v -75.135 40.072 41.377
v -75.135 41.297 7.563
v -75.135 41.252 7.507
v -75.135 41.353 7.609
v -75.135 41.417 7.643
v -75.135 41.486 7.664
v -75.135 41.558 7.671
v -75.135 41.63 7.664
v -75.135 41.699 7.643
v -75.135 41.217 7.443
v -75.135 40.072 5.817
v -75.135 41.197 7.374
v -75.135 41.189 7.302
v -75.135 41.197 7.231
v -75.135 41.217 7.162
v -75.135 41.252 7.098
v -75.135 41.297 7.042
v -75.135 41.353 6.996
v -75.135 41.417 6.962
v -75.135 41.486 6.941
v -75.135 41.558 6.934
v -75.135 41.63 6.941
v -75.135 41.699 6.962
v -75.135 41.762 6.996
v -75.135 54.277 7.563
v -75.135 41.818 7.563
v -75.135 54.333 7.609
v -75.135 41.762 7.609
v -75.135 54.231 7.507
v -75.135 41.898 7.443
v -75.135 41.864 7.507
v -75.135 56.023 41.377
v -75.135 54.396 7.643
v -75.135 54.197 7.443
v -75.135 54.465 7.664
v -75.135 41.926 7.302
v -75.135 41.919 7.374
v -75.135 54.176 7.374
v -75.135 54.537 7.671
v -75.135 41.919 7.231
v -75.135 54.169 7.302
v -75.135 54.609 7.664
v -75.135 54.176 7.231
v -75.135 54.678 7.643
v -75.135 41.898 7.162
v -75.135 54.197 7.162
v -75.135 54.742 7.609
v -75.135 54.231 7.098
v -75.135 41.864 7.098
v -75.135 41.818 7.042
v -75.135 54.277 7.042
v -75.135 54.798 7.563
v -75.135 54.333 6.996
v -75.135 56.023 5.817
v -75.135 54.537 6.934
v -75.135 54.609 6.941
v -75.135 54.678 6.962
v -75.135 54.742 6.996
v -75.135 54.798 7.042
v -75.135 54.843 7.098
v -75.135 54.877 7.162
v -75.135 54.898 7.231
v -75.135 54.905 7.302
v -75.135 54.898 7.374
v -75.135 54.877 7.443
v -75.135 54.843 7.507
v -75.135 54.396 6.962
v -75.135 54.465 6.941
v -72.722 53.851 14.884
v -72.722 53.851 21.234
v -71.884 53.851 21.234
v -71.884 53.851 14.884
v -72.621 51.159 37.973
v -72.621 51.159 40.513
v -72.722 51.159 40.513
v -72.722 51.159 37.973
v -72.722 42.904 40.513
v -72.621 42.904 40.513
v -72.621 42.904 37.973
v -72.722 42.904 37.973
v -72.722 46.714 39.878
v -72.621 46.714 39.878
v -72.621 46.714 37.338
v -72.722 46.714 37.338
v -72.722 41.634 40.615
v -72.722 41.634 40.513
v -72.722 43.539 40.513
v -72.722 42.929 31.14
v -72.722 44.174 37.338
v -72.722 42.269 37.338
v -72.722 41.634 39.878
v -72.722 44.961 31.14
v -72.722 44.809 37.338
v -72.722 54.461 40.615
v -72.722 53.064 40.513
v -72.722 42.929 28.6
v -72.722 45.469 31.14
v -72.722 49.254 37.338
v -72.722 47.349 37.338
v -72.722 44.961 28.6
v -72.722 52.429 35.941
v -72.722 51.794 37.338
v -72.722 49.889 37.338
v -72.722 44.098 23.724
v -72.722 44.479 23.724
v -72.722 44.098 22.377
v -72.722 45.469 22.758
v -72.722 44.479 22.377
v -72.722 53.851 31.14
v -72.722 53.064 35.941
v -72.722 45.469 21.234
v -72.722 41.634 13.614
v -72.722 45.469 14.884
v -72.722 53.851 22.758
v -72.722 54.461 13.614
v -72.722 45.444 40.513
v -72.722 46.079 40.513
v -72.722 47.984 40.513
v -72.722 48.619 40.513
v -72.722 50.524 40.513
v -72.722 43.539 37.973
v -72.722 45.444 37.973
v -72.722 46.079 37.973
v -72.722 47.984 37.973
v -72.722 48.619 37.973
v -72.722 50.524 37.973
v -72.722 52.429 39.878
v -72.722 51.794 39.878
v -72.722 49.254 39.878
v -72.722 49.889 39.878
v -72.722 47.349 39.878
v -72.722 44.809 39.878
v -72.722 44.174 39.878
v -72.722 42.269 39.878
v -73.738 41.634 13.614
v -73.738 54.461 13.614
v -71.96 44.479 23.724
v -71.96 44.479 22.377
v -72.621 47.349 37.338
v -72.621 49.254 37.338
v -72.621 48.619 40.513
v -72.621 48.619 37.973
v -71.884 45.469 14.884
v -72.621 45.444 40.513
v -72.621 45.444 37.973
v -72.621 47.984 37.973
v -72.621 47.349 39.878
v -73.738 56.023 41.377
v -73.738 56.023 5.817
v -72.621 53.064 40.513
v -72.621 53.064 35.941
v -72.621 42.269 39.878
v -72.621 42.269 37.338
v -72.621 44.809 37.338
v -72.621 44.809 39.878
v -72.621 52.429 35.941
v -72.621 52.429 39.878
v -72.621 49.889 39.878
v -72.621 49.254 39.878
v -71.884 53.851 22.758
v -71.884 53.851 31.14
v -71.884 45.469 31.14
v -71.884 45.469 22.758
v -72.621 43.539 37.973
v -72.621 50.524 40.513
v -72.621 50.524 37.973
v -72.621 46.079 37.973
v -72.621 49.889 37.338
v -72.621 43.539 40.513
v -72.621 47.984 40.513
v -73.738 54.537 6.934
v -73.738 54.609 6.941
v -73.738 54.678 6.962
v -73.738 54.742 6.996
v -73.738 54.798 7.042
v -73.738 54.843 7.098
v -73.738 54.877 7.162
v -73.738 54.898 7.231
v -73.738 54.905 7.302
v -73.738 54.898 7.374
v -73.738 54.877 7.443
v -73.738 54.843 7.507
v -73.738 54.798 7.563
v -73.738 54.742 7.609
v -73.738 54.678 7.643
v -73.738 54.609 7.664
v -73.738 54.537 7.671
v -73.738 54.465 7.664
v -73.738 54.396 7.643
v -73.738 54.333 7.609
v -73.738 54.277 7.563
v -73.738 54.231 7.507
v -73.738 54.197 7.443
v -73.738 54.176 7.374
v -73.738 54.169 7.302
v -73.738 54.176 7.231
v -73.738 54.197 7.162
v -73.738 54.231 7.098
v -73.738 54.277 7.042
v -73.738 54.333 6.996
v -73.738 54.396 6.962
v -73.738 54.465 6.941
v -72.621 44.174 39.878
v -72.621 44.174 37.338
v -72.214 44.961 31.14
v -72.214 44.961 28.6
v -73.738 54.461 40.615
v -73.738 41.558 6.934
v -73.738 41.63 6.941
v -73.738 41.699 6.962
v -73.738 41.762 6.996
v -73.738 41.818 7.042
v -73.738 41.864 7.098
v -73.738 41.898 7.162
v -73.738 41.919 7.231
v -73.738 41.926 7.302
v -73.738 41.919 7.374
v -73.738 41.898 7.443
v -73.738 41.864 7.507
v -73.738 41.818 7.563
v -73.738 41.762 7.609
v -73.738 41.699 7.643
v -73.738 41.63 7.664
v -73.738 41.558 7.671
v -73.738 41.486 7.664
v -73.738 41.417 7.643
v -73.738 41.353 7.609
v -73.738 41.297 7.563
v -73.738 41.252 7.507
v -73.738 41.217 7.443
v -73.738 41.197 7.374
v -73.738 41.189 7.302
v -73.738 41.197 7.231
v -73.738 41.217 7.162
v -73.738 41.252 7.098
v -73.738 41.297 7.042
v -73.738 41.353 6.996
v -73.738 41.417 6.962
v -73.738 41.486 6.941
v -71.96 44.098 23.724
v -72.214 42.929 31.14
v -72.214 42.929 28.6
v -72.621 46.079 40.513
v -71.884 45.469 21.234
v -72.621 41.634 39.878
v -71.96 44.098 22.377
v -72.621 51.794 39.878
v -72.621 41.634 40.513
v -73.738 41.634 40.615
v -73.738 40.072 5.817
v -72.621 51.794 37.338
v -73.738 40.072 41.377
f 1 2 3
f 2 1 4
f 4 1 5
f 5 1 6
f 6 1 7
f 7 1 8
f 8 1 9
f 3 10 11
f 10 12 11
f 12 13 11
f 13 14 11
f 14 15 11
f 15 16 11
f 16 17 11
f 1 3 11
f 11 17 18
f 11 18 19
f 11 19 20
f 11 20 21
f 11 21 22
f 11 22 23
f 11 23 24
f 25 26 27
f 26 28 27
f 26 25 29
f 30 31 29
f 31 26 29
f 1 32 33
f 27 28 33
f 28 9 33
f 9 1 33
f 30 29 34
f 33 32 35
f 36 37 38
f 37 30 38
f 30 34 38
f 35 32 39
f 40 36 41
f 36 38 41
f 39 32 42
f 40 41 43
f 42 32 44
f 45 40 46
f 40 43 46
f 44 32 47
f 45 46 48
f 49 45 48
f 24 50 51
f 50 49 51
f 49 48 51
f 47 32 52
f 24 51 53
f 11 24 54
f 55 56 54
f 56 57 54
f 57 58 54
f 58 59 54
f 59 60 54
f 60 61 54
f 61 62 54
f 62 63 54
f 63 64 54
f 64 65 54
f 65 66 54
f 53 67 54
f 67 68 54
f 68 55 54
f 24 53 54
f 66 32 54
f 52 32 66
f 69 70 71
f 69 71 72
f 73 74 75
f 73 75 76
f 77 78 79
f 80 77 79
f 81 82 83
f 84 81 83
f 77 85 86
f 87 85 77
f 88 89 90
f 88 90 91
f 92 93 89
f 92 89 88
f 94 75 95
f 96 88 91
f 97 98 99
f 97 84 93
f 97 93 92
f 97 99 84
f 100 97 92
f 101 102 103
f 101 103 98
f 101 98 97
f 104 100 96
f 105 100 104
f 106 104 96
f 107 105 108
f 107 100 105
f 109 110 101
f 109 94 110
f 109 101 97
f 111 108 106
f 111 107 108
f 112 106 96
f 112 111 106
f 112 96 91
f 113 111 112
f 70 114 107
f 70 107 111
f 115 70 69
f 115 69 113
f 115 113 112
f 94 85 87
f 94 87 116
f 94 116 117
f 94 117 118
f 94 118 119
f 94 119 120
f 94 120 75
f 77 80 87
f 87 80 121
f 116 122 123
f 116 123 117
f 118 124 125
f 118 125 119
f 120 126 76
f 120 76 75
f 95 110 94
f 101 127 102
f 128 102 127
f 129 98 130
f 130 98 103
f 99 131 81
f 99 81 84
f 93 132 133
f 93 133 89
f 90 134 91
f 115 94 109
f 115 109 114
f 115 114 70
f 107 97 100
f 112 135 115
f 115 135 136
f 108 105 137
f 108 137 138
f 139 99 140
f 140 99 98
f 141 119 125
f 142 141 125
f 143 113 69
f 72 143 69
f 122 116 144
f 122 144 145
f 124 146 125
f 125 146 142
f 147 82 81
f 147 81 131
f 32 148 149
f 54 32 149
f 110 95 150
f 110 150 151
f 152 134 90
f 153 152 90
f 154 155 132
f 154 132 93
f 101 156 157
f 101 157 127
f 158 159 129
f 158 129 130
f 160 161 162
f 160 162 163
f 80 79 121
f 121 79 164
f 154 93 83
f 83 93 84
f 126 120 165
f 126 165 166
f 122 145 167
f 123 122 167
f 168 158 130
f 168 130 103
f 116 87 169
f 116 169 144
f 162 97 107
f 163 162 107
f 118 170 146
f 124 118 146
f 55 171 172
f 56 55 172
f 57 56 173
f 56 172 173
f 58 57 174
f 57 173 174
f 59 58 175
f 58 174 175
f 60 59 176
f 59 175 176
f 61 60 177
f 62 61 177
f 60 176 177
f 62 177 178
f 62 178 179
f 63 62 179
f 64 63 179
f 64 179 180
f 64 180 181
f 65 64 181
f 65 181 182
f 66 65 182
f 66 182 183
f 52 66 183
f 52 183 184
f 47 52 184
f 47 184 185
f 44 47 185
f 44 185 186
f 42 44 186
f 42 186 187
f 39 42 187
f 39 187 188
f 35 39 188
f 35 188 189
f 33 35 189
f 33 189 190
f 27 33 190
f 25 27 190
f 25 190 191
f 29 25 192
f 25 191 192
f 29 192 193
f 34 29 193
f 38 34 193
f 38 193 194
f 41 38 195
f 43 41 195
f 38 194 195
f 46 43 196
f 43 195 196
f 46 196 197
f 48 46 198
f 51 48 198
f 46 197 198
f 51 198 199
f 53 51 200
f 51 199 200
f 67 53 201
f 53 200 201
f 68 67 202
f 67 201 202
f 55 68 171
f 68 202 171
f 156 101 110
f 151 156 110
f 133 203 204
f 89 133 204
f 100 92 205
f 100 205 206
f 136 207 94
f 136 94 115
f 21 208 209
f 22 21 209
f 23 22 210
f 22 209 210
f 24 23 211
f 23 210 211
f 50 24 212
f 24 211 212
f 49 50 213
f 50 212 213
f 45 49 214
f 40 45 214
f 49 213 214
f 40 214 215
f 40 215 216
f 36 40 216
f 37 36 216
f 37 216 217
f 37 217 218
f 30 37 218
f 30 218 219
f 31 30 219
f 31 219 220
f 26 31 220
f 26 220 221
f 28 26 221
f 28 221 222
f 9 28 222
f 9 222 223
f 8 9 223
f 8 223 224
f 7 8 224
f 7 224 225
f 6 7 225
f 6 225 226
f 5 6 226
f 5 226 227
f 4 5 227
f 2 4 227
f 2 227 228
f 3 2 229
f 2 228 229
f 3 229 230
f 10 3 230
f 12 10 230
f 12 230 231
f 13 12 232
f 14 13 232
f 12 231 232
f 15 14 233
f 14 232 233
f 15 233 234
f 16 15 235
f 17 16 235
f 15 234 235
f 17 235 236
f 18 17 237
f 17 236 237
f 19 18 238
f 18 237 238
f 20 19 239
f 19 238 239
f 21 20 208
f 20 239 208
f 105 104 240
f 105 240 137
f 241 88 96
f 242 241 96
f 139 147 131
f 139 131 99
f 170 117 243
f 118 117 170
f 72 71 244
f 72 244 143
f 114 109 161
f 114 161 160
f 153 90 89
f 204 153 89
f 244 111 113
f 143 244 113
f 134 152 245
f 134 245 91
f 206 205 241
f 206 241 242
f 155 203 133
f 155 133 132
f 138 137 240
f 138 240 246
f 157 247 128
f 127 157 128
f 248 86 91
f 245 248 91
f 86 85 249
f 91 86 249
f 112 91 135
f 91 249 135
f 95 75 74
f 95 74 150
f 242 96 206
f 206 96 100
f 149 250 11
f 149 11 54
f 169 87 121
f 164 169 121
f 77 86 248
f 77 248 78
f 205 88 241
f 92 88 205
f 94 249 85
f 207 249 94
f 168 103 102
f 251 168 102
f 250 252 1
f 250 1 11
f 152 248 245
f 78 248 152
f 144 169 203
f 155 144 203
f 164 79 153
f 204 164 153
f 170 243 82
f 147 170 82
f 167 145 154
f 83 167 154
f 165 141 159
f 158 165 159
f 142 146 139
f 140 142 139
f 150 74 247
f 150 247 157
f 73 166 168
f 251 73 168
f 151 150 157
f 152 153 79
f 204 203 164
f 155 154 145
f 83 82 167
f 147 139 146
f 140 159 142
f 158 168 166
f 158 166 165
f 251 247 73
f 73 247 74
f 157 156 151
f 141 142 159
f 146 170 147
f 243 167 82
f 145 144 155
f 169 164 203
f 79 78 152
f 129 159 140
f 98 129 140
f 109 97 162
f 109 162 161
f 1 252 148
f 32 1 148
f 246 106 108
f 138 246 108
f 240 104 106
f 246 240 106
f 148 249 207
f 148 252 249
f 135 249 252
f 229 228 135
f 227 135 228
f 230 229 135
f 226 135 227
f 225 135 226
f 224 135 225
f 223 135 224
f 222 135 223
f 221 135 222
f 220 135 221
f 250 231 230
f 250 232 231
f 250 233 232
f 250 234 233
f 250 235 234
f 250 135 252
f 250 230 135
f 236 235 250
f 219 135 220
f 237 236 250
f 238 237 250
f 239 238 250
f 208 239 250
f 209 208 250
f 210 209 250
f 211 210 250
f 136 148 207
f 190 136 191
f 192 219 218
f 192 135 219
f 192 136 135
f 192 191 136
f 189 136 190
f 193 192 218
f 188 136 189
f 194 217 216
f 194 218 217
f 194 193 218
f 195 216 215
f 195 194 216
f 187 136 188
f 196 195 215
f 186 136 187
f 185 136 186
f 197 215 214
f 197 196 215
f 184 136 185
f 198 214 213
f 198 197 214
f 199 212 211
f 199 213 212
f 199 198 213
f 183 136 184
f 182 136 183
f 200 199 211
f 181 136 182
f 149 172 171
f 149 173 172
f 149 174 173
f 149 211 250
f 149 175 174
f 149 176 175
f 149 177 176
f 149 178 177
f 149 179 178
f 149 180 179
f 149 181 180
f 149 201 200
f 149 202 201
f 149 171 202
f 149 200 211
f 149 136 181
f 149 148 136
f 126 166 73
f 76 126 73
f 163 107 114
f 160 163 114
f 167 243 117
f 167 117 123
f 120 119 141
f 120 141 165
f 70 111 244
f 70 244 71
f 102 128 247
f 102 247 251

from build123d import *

# Parameters (mm, degrees)
SKETCH1_W            = 35.56
SKETCH1_H            = 15.9512
BOSS_EXTRUDE1_DEPTH  = 1.397
SKETCH14_W           = 27.0002
SKETCH14_H           = 12.827
BOSS_EXTRUDE14_DEPTH = 1.016
SKETCH15_W           = 4.572
SKETCH15_H           = 11.43
BOSS_EXTRUDE15_DEPTH = 0.1016
SKETCH16_W           = 0.1016
SKETCH16_H           = 10.795
CUT_EXTRUDE1_DEPTH   = 3.937
SKETCH17_W           = 2.54
SKETCH17_H           = 9.525
BOSS_EXTRUDE16_DEPTH = 0.1016
SKETCH18_W           = 2.54
SKETCH18_H           = 3.175
CUT_EXTRUDE2_DEPTH   = 0.1016
SKETCH19_W           = 2.54
SKETCH19_H           = 1.905
BOSS_EXTRUDE17_DEPTH = 0.1016
SKETCH20_W           = 2.54
SKETCH20_H           = 0.635
CUT_EXTRUDE3_DEPTH   = 0.1016
SKETCH21_W           = 2.54
SKETCH21_H           = 0.635
CUT_EXTRUDE4_DEPTH   = 0.1016
SKETCH22_W           = 2.54
SKETCH22_H           = 3.175
CUT_EXTRUDE5_DEPTH   = 0.1016
SKETCH23_W           = 2.54
SKETCH23_H           = 1.905
BOSS_EXTRUDE18_DEPTH = 0.1016
SKETCH24_W           = 2.54
SKETCH24_H           = 0.635
CUT_EXTRUDE6_DEPTH   = 0.1016
SKETCH25_W           = 1.3462
SKETCH25_H           = 0.381
BOSS_EXTRUDE19_DEPTH = 0.762
SKETCH26_W           = 6.35
SKETCH26_H           = 8.382
BOSS_EXTRUDE20_DEPTH = 0.8382
SKETCH27_W           = 8.382
SKETCH27_H           = 8.382
BOSS_EXTRUDE21_DEPTH = 0.8382
SKETCH28_W           = 2.54
SKETCH28_H           = 2.032
BOSS_EXTRUDE22_DEPTH = 0.508
HOLE1_D              = 0.7366
HOLE1_DEPTH          = 3.2512


with BuildPart() as part:
    # Sketch1 → Boss-Extrude1 (new body)
    with BuildSketch(Plane(origin=(-73.738355388, 0, 0), x_dir=(0, 0, -1), z_dir=(1, 0, 0))):
        with Locations((-23.5966, 48.047439016)):
            Rectangle(SKETCH1_W, SKETCH1_H)
    extrude(amount=-BOSS_EXTRUDE1_DEPTH)

    # Sketch14 → Boss-Extrude14 (add)
    with BuildSketch(Plane(origin=(-73.738355388, 0, 0), x_dir=(0, 0, -1), z_dir=(1, 0, 0))):
        with Locations((-27.1145, 48.047439016)):
            Rectangle(SKETCH14_W, SKETCH14_H)
    extrude(amount=BOSS_EXTRUDE14_DEPTH)

    # Sketch15 → Boss-Extrude15 (add)
    with BuildSketch(Plane(origin=(-72.722355388, 0, 0), x_dir=(0, 0, -1), z_dir=(1, 0, 0))):
        with Locations((-38.227, 47.348939016)):
            Rectangle(SKETCH15_W, SKETCH15_H)
    extrude(amount=BOSS_EXTRUDE15_DEPTH)

    # Sketch16 → Cut-Extrude1 (cut)
    with BuildSketch(Plane(origin=(0, 0, 35.941), x_dir=(-1, 0, 0), z_dir=(0, 0, -1))):
        with Locations((72.671555388, 47.031439016)):
            Rectangle(SKETCH16_W, SKETCH16_H)
    extrude(amount=-CUT_EXTRUDE1_DEPTH, mode=Mode.SUBTRACT)

    # Sketch17 → Boss-Extrude16 (add)
    with BuildSketch(Plane(origin=(-72.722355388, 0, 0), x_dir=(0, 0, -1), z_dir=(1, 0, 0))):
        with Locations((-38.608, 47.031439016)):
            Rectangle(SKETCH17_W, SKETCH17_H)
    extrude(amount=BOSS_EXTRUDE16_DEPTH)

    # Sketch18 → Cut-Extrude2 (cut)
    with BuildSketch(Plane(origin=(-72.620755388, 0, 0), x_dir=(0, 0, -1), z_dir=(1, 0, 0))):
        with Locations((-39.243, 49.571439016)):
            Rectangle(SKETCH18_W, SKETCH18_H)
    extrude(amount=-CUT_EXTRUDE2_DEPTH, mode=Mode.SUBTRACT)

    # Sketch19 → Boss-Extrude17 (add)
    with BuildSketch(Plane(origin=(-72.722355388, 0, 0), x_dir=(0, 0, -1), z_dir=(1, 0, 0))):
        with Locations((-39.243, 49.571439016)):
            Rectangle(SKETCH19_W, SKETCH19_H)
    extrude(amount=BOSS_EXTRUDE17_DEPTH)

    # Sketch20 → Cut-Extrude3 (cut)
    with BuildSketch(Plane(origin=(-72.620755388, 0, 0), x_dir=(0, 0, -1), z_dir=(1, 0, 0))):
        with Locations((-38.608, 49.571439016)):
            Rectangle(SKETCH20_W, SKETCH20_H)
    extrude(amount=-CUT_EXTRUDE3_DEPTH, mode=Mode.SUBTRACT)

    # Sketch21 → Cut-Extrude4 (cut)
    with BuildSketch(Plane(origin=(-72.620755388, 0, 0), x_dir=(0, 0, -1), z_dir=(1, 0, 0))):
        with Locations((-38.608, 47.031439016)):
            Rectangle(SKETCH21_W, SKETCH21_H)
    extrude(amount=-CUT_EXTRUDE4_DEPTH, mode=Mode.SUBTRACT)

    # Sketch22 → Cut-Extrude5 (cut)
    with BuildSketch(Plane(origin=(-72.620755388, 0, 0), x_dir=(0, 0, -1), z_dir=(1, 0, 0))):
        with Locations((-39.243, 44.491439016)):
            Rectangle(SKETCH22_W, SKETCH22_H)
    extrude(amount=-CUT_EXTRUDE5_DEPTH, mode=Mode.SUBTRACT)

    # Sketch23 → Boss-Extrude18 (add)
    with BuildSketch(Plane(origin=(-72.722355388, 0, 0), x_dir=(0, 0, -1), z_dir=(1, 0, 0))):
        with Locations((-39.243, 44.491439016)):
            Rectangle(SKETCH23_W, SKETCH23_H)
    extrude(amount=BOSS_EXTRUDE18_DEPTH)

    # Sketch24 → Cut-Extrude6 (cut)
    with BuildSketch(Plane(origin=(-72.620755388, 0, 0), x_dir=(0, 0, -1), z_dir=(1, 0, 0))):
        with Locations((-38.608, 44.491439016)):
            Rectangle(SKETCH24_W, SKETCH24_H)
    extrude(amount=-CUT_EXTRUDE6_DEPTH, mode=Mode.SUBTRACT)

    # Sketch25 → Boss-Extrude19 (add)
    with BuildSketch(Plane(origin=(-72.722355388, 0, 0), x_dir=(0, 0, -1), z_dir=(1, 0, 0))):
        with Locations((-23.0505, 44.288239016)):
            Rectangle(SKETCH25_W, SKETCH25_H)
    extrude(amount=BOSS_EXTRUDE19_DEPTH)

    # Sketch26 → Boss-Extrude20 (add)
    with BuildSketch(Plane(origin=(-72.722355388, 0, 0), x_dir=(0, 0, -1), z_dir=(1, 0, 0))):
        with Locations((-18.0594, 49.660339016)):
            Rectangle(SKETCH26_W, SKETCH26_H)
    extrude(amount=BOSS_EXTRUDE20_DEPTH)

    # Sketch27 → Boss-Extrude21 (add)
    with BuildSketch(Plane(origin=(-72.722355388, 0, 0), x_dir=(0, 0, -1), z_dir=(1, 0, 0))):
        with Locations((-26.9494, 49.660339016)):
            Rectangle(SKETCH27_W, SKETCH27_H)
    extrude(amount=BOSS_EXTRUDE21_DEPTH)

    # Sketch28 → Boss-Extrude22 (add)
    with BuildSketch(Plane(origin=(-72.722355388, 0, 0), x_dir=(0, 0, -1), z_dir=(1, 0, 0))):
        with Locations((-29.8704, 43.945339016)):
            Rectangle(SKETCH28_W, SKETCH28_H)
    extrude(amount=BOSS_EXTRUDE22_DEPTH)

    # Hole1
    with Locations(Plane.ZY.offset(75.135355388)):
        with Locations((7.3025, 41.557739016), (7.3025, 54.537139016)):
            Hole(HOLE1_D / 2, depth=HOLE1_DEPTH)


solid = part.part
